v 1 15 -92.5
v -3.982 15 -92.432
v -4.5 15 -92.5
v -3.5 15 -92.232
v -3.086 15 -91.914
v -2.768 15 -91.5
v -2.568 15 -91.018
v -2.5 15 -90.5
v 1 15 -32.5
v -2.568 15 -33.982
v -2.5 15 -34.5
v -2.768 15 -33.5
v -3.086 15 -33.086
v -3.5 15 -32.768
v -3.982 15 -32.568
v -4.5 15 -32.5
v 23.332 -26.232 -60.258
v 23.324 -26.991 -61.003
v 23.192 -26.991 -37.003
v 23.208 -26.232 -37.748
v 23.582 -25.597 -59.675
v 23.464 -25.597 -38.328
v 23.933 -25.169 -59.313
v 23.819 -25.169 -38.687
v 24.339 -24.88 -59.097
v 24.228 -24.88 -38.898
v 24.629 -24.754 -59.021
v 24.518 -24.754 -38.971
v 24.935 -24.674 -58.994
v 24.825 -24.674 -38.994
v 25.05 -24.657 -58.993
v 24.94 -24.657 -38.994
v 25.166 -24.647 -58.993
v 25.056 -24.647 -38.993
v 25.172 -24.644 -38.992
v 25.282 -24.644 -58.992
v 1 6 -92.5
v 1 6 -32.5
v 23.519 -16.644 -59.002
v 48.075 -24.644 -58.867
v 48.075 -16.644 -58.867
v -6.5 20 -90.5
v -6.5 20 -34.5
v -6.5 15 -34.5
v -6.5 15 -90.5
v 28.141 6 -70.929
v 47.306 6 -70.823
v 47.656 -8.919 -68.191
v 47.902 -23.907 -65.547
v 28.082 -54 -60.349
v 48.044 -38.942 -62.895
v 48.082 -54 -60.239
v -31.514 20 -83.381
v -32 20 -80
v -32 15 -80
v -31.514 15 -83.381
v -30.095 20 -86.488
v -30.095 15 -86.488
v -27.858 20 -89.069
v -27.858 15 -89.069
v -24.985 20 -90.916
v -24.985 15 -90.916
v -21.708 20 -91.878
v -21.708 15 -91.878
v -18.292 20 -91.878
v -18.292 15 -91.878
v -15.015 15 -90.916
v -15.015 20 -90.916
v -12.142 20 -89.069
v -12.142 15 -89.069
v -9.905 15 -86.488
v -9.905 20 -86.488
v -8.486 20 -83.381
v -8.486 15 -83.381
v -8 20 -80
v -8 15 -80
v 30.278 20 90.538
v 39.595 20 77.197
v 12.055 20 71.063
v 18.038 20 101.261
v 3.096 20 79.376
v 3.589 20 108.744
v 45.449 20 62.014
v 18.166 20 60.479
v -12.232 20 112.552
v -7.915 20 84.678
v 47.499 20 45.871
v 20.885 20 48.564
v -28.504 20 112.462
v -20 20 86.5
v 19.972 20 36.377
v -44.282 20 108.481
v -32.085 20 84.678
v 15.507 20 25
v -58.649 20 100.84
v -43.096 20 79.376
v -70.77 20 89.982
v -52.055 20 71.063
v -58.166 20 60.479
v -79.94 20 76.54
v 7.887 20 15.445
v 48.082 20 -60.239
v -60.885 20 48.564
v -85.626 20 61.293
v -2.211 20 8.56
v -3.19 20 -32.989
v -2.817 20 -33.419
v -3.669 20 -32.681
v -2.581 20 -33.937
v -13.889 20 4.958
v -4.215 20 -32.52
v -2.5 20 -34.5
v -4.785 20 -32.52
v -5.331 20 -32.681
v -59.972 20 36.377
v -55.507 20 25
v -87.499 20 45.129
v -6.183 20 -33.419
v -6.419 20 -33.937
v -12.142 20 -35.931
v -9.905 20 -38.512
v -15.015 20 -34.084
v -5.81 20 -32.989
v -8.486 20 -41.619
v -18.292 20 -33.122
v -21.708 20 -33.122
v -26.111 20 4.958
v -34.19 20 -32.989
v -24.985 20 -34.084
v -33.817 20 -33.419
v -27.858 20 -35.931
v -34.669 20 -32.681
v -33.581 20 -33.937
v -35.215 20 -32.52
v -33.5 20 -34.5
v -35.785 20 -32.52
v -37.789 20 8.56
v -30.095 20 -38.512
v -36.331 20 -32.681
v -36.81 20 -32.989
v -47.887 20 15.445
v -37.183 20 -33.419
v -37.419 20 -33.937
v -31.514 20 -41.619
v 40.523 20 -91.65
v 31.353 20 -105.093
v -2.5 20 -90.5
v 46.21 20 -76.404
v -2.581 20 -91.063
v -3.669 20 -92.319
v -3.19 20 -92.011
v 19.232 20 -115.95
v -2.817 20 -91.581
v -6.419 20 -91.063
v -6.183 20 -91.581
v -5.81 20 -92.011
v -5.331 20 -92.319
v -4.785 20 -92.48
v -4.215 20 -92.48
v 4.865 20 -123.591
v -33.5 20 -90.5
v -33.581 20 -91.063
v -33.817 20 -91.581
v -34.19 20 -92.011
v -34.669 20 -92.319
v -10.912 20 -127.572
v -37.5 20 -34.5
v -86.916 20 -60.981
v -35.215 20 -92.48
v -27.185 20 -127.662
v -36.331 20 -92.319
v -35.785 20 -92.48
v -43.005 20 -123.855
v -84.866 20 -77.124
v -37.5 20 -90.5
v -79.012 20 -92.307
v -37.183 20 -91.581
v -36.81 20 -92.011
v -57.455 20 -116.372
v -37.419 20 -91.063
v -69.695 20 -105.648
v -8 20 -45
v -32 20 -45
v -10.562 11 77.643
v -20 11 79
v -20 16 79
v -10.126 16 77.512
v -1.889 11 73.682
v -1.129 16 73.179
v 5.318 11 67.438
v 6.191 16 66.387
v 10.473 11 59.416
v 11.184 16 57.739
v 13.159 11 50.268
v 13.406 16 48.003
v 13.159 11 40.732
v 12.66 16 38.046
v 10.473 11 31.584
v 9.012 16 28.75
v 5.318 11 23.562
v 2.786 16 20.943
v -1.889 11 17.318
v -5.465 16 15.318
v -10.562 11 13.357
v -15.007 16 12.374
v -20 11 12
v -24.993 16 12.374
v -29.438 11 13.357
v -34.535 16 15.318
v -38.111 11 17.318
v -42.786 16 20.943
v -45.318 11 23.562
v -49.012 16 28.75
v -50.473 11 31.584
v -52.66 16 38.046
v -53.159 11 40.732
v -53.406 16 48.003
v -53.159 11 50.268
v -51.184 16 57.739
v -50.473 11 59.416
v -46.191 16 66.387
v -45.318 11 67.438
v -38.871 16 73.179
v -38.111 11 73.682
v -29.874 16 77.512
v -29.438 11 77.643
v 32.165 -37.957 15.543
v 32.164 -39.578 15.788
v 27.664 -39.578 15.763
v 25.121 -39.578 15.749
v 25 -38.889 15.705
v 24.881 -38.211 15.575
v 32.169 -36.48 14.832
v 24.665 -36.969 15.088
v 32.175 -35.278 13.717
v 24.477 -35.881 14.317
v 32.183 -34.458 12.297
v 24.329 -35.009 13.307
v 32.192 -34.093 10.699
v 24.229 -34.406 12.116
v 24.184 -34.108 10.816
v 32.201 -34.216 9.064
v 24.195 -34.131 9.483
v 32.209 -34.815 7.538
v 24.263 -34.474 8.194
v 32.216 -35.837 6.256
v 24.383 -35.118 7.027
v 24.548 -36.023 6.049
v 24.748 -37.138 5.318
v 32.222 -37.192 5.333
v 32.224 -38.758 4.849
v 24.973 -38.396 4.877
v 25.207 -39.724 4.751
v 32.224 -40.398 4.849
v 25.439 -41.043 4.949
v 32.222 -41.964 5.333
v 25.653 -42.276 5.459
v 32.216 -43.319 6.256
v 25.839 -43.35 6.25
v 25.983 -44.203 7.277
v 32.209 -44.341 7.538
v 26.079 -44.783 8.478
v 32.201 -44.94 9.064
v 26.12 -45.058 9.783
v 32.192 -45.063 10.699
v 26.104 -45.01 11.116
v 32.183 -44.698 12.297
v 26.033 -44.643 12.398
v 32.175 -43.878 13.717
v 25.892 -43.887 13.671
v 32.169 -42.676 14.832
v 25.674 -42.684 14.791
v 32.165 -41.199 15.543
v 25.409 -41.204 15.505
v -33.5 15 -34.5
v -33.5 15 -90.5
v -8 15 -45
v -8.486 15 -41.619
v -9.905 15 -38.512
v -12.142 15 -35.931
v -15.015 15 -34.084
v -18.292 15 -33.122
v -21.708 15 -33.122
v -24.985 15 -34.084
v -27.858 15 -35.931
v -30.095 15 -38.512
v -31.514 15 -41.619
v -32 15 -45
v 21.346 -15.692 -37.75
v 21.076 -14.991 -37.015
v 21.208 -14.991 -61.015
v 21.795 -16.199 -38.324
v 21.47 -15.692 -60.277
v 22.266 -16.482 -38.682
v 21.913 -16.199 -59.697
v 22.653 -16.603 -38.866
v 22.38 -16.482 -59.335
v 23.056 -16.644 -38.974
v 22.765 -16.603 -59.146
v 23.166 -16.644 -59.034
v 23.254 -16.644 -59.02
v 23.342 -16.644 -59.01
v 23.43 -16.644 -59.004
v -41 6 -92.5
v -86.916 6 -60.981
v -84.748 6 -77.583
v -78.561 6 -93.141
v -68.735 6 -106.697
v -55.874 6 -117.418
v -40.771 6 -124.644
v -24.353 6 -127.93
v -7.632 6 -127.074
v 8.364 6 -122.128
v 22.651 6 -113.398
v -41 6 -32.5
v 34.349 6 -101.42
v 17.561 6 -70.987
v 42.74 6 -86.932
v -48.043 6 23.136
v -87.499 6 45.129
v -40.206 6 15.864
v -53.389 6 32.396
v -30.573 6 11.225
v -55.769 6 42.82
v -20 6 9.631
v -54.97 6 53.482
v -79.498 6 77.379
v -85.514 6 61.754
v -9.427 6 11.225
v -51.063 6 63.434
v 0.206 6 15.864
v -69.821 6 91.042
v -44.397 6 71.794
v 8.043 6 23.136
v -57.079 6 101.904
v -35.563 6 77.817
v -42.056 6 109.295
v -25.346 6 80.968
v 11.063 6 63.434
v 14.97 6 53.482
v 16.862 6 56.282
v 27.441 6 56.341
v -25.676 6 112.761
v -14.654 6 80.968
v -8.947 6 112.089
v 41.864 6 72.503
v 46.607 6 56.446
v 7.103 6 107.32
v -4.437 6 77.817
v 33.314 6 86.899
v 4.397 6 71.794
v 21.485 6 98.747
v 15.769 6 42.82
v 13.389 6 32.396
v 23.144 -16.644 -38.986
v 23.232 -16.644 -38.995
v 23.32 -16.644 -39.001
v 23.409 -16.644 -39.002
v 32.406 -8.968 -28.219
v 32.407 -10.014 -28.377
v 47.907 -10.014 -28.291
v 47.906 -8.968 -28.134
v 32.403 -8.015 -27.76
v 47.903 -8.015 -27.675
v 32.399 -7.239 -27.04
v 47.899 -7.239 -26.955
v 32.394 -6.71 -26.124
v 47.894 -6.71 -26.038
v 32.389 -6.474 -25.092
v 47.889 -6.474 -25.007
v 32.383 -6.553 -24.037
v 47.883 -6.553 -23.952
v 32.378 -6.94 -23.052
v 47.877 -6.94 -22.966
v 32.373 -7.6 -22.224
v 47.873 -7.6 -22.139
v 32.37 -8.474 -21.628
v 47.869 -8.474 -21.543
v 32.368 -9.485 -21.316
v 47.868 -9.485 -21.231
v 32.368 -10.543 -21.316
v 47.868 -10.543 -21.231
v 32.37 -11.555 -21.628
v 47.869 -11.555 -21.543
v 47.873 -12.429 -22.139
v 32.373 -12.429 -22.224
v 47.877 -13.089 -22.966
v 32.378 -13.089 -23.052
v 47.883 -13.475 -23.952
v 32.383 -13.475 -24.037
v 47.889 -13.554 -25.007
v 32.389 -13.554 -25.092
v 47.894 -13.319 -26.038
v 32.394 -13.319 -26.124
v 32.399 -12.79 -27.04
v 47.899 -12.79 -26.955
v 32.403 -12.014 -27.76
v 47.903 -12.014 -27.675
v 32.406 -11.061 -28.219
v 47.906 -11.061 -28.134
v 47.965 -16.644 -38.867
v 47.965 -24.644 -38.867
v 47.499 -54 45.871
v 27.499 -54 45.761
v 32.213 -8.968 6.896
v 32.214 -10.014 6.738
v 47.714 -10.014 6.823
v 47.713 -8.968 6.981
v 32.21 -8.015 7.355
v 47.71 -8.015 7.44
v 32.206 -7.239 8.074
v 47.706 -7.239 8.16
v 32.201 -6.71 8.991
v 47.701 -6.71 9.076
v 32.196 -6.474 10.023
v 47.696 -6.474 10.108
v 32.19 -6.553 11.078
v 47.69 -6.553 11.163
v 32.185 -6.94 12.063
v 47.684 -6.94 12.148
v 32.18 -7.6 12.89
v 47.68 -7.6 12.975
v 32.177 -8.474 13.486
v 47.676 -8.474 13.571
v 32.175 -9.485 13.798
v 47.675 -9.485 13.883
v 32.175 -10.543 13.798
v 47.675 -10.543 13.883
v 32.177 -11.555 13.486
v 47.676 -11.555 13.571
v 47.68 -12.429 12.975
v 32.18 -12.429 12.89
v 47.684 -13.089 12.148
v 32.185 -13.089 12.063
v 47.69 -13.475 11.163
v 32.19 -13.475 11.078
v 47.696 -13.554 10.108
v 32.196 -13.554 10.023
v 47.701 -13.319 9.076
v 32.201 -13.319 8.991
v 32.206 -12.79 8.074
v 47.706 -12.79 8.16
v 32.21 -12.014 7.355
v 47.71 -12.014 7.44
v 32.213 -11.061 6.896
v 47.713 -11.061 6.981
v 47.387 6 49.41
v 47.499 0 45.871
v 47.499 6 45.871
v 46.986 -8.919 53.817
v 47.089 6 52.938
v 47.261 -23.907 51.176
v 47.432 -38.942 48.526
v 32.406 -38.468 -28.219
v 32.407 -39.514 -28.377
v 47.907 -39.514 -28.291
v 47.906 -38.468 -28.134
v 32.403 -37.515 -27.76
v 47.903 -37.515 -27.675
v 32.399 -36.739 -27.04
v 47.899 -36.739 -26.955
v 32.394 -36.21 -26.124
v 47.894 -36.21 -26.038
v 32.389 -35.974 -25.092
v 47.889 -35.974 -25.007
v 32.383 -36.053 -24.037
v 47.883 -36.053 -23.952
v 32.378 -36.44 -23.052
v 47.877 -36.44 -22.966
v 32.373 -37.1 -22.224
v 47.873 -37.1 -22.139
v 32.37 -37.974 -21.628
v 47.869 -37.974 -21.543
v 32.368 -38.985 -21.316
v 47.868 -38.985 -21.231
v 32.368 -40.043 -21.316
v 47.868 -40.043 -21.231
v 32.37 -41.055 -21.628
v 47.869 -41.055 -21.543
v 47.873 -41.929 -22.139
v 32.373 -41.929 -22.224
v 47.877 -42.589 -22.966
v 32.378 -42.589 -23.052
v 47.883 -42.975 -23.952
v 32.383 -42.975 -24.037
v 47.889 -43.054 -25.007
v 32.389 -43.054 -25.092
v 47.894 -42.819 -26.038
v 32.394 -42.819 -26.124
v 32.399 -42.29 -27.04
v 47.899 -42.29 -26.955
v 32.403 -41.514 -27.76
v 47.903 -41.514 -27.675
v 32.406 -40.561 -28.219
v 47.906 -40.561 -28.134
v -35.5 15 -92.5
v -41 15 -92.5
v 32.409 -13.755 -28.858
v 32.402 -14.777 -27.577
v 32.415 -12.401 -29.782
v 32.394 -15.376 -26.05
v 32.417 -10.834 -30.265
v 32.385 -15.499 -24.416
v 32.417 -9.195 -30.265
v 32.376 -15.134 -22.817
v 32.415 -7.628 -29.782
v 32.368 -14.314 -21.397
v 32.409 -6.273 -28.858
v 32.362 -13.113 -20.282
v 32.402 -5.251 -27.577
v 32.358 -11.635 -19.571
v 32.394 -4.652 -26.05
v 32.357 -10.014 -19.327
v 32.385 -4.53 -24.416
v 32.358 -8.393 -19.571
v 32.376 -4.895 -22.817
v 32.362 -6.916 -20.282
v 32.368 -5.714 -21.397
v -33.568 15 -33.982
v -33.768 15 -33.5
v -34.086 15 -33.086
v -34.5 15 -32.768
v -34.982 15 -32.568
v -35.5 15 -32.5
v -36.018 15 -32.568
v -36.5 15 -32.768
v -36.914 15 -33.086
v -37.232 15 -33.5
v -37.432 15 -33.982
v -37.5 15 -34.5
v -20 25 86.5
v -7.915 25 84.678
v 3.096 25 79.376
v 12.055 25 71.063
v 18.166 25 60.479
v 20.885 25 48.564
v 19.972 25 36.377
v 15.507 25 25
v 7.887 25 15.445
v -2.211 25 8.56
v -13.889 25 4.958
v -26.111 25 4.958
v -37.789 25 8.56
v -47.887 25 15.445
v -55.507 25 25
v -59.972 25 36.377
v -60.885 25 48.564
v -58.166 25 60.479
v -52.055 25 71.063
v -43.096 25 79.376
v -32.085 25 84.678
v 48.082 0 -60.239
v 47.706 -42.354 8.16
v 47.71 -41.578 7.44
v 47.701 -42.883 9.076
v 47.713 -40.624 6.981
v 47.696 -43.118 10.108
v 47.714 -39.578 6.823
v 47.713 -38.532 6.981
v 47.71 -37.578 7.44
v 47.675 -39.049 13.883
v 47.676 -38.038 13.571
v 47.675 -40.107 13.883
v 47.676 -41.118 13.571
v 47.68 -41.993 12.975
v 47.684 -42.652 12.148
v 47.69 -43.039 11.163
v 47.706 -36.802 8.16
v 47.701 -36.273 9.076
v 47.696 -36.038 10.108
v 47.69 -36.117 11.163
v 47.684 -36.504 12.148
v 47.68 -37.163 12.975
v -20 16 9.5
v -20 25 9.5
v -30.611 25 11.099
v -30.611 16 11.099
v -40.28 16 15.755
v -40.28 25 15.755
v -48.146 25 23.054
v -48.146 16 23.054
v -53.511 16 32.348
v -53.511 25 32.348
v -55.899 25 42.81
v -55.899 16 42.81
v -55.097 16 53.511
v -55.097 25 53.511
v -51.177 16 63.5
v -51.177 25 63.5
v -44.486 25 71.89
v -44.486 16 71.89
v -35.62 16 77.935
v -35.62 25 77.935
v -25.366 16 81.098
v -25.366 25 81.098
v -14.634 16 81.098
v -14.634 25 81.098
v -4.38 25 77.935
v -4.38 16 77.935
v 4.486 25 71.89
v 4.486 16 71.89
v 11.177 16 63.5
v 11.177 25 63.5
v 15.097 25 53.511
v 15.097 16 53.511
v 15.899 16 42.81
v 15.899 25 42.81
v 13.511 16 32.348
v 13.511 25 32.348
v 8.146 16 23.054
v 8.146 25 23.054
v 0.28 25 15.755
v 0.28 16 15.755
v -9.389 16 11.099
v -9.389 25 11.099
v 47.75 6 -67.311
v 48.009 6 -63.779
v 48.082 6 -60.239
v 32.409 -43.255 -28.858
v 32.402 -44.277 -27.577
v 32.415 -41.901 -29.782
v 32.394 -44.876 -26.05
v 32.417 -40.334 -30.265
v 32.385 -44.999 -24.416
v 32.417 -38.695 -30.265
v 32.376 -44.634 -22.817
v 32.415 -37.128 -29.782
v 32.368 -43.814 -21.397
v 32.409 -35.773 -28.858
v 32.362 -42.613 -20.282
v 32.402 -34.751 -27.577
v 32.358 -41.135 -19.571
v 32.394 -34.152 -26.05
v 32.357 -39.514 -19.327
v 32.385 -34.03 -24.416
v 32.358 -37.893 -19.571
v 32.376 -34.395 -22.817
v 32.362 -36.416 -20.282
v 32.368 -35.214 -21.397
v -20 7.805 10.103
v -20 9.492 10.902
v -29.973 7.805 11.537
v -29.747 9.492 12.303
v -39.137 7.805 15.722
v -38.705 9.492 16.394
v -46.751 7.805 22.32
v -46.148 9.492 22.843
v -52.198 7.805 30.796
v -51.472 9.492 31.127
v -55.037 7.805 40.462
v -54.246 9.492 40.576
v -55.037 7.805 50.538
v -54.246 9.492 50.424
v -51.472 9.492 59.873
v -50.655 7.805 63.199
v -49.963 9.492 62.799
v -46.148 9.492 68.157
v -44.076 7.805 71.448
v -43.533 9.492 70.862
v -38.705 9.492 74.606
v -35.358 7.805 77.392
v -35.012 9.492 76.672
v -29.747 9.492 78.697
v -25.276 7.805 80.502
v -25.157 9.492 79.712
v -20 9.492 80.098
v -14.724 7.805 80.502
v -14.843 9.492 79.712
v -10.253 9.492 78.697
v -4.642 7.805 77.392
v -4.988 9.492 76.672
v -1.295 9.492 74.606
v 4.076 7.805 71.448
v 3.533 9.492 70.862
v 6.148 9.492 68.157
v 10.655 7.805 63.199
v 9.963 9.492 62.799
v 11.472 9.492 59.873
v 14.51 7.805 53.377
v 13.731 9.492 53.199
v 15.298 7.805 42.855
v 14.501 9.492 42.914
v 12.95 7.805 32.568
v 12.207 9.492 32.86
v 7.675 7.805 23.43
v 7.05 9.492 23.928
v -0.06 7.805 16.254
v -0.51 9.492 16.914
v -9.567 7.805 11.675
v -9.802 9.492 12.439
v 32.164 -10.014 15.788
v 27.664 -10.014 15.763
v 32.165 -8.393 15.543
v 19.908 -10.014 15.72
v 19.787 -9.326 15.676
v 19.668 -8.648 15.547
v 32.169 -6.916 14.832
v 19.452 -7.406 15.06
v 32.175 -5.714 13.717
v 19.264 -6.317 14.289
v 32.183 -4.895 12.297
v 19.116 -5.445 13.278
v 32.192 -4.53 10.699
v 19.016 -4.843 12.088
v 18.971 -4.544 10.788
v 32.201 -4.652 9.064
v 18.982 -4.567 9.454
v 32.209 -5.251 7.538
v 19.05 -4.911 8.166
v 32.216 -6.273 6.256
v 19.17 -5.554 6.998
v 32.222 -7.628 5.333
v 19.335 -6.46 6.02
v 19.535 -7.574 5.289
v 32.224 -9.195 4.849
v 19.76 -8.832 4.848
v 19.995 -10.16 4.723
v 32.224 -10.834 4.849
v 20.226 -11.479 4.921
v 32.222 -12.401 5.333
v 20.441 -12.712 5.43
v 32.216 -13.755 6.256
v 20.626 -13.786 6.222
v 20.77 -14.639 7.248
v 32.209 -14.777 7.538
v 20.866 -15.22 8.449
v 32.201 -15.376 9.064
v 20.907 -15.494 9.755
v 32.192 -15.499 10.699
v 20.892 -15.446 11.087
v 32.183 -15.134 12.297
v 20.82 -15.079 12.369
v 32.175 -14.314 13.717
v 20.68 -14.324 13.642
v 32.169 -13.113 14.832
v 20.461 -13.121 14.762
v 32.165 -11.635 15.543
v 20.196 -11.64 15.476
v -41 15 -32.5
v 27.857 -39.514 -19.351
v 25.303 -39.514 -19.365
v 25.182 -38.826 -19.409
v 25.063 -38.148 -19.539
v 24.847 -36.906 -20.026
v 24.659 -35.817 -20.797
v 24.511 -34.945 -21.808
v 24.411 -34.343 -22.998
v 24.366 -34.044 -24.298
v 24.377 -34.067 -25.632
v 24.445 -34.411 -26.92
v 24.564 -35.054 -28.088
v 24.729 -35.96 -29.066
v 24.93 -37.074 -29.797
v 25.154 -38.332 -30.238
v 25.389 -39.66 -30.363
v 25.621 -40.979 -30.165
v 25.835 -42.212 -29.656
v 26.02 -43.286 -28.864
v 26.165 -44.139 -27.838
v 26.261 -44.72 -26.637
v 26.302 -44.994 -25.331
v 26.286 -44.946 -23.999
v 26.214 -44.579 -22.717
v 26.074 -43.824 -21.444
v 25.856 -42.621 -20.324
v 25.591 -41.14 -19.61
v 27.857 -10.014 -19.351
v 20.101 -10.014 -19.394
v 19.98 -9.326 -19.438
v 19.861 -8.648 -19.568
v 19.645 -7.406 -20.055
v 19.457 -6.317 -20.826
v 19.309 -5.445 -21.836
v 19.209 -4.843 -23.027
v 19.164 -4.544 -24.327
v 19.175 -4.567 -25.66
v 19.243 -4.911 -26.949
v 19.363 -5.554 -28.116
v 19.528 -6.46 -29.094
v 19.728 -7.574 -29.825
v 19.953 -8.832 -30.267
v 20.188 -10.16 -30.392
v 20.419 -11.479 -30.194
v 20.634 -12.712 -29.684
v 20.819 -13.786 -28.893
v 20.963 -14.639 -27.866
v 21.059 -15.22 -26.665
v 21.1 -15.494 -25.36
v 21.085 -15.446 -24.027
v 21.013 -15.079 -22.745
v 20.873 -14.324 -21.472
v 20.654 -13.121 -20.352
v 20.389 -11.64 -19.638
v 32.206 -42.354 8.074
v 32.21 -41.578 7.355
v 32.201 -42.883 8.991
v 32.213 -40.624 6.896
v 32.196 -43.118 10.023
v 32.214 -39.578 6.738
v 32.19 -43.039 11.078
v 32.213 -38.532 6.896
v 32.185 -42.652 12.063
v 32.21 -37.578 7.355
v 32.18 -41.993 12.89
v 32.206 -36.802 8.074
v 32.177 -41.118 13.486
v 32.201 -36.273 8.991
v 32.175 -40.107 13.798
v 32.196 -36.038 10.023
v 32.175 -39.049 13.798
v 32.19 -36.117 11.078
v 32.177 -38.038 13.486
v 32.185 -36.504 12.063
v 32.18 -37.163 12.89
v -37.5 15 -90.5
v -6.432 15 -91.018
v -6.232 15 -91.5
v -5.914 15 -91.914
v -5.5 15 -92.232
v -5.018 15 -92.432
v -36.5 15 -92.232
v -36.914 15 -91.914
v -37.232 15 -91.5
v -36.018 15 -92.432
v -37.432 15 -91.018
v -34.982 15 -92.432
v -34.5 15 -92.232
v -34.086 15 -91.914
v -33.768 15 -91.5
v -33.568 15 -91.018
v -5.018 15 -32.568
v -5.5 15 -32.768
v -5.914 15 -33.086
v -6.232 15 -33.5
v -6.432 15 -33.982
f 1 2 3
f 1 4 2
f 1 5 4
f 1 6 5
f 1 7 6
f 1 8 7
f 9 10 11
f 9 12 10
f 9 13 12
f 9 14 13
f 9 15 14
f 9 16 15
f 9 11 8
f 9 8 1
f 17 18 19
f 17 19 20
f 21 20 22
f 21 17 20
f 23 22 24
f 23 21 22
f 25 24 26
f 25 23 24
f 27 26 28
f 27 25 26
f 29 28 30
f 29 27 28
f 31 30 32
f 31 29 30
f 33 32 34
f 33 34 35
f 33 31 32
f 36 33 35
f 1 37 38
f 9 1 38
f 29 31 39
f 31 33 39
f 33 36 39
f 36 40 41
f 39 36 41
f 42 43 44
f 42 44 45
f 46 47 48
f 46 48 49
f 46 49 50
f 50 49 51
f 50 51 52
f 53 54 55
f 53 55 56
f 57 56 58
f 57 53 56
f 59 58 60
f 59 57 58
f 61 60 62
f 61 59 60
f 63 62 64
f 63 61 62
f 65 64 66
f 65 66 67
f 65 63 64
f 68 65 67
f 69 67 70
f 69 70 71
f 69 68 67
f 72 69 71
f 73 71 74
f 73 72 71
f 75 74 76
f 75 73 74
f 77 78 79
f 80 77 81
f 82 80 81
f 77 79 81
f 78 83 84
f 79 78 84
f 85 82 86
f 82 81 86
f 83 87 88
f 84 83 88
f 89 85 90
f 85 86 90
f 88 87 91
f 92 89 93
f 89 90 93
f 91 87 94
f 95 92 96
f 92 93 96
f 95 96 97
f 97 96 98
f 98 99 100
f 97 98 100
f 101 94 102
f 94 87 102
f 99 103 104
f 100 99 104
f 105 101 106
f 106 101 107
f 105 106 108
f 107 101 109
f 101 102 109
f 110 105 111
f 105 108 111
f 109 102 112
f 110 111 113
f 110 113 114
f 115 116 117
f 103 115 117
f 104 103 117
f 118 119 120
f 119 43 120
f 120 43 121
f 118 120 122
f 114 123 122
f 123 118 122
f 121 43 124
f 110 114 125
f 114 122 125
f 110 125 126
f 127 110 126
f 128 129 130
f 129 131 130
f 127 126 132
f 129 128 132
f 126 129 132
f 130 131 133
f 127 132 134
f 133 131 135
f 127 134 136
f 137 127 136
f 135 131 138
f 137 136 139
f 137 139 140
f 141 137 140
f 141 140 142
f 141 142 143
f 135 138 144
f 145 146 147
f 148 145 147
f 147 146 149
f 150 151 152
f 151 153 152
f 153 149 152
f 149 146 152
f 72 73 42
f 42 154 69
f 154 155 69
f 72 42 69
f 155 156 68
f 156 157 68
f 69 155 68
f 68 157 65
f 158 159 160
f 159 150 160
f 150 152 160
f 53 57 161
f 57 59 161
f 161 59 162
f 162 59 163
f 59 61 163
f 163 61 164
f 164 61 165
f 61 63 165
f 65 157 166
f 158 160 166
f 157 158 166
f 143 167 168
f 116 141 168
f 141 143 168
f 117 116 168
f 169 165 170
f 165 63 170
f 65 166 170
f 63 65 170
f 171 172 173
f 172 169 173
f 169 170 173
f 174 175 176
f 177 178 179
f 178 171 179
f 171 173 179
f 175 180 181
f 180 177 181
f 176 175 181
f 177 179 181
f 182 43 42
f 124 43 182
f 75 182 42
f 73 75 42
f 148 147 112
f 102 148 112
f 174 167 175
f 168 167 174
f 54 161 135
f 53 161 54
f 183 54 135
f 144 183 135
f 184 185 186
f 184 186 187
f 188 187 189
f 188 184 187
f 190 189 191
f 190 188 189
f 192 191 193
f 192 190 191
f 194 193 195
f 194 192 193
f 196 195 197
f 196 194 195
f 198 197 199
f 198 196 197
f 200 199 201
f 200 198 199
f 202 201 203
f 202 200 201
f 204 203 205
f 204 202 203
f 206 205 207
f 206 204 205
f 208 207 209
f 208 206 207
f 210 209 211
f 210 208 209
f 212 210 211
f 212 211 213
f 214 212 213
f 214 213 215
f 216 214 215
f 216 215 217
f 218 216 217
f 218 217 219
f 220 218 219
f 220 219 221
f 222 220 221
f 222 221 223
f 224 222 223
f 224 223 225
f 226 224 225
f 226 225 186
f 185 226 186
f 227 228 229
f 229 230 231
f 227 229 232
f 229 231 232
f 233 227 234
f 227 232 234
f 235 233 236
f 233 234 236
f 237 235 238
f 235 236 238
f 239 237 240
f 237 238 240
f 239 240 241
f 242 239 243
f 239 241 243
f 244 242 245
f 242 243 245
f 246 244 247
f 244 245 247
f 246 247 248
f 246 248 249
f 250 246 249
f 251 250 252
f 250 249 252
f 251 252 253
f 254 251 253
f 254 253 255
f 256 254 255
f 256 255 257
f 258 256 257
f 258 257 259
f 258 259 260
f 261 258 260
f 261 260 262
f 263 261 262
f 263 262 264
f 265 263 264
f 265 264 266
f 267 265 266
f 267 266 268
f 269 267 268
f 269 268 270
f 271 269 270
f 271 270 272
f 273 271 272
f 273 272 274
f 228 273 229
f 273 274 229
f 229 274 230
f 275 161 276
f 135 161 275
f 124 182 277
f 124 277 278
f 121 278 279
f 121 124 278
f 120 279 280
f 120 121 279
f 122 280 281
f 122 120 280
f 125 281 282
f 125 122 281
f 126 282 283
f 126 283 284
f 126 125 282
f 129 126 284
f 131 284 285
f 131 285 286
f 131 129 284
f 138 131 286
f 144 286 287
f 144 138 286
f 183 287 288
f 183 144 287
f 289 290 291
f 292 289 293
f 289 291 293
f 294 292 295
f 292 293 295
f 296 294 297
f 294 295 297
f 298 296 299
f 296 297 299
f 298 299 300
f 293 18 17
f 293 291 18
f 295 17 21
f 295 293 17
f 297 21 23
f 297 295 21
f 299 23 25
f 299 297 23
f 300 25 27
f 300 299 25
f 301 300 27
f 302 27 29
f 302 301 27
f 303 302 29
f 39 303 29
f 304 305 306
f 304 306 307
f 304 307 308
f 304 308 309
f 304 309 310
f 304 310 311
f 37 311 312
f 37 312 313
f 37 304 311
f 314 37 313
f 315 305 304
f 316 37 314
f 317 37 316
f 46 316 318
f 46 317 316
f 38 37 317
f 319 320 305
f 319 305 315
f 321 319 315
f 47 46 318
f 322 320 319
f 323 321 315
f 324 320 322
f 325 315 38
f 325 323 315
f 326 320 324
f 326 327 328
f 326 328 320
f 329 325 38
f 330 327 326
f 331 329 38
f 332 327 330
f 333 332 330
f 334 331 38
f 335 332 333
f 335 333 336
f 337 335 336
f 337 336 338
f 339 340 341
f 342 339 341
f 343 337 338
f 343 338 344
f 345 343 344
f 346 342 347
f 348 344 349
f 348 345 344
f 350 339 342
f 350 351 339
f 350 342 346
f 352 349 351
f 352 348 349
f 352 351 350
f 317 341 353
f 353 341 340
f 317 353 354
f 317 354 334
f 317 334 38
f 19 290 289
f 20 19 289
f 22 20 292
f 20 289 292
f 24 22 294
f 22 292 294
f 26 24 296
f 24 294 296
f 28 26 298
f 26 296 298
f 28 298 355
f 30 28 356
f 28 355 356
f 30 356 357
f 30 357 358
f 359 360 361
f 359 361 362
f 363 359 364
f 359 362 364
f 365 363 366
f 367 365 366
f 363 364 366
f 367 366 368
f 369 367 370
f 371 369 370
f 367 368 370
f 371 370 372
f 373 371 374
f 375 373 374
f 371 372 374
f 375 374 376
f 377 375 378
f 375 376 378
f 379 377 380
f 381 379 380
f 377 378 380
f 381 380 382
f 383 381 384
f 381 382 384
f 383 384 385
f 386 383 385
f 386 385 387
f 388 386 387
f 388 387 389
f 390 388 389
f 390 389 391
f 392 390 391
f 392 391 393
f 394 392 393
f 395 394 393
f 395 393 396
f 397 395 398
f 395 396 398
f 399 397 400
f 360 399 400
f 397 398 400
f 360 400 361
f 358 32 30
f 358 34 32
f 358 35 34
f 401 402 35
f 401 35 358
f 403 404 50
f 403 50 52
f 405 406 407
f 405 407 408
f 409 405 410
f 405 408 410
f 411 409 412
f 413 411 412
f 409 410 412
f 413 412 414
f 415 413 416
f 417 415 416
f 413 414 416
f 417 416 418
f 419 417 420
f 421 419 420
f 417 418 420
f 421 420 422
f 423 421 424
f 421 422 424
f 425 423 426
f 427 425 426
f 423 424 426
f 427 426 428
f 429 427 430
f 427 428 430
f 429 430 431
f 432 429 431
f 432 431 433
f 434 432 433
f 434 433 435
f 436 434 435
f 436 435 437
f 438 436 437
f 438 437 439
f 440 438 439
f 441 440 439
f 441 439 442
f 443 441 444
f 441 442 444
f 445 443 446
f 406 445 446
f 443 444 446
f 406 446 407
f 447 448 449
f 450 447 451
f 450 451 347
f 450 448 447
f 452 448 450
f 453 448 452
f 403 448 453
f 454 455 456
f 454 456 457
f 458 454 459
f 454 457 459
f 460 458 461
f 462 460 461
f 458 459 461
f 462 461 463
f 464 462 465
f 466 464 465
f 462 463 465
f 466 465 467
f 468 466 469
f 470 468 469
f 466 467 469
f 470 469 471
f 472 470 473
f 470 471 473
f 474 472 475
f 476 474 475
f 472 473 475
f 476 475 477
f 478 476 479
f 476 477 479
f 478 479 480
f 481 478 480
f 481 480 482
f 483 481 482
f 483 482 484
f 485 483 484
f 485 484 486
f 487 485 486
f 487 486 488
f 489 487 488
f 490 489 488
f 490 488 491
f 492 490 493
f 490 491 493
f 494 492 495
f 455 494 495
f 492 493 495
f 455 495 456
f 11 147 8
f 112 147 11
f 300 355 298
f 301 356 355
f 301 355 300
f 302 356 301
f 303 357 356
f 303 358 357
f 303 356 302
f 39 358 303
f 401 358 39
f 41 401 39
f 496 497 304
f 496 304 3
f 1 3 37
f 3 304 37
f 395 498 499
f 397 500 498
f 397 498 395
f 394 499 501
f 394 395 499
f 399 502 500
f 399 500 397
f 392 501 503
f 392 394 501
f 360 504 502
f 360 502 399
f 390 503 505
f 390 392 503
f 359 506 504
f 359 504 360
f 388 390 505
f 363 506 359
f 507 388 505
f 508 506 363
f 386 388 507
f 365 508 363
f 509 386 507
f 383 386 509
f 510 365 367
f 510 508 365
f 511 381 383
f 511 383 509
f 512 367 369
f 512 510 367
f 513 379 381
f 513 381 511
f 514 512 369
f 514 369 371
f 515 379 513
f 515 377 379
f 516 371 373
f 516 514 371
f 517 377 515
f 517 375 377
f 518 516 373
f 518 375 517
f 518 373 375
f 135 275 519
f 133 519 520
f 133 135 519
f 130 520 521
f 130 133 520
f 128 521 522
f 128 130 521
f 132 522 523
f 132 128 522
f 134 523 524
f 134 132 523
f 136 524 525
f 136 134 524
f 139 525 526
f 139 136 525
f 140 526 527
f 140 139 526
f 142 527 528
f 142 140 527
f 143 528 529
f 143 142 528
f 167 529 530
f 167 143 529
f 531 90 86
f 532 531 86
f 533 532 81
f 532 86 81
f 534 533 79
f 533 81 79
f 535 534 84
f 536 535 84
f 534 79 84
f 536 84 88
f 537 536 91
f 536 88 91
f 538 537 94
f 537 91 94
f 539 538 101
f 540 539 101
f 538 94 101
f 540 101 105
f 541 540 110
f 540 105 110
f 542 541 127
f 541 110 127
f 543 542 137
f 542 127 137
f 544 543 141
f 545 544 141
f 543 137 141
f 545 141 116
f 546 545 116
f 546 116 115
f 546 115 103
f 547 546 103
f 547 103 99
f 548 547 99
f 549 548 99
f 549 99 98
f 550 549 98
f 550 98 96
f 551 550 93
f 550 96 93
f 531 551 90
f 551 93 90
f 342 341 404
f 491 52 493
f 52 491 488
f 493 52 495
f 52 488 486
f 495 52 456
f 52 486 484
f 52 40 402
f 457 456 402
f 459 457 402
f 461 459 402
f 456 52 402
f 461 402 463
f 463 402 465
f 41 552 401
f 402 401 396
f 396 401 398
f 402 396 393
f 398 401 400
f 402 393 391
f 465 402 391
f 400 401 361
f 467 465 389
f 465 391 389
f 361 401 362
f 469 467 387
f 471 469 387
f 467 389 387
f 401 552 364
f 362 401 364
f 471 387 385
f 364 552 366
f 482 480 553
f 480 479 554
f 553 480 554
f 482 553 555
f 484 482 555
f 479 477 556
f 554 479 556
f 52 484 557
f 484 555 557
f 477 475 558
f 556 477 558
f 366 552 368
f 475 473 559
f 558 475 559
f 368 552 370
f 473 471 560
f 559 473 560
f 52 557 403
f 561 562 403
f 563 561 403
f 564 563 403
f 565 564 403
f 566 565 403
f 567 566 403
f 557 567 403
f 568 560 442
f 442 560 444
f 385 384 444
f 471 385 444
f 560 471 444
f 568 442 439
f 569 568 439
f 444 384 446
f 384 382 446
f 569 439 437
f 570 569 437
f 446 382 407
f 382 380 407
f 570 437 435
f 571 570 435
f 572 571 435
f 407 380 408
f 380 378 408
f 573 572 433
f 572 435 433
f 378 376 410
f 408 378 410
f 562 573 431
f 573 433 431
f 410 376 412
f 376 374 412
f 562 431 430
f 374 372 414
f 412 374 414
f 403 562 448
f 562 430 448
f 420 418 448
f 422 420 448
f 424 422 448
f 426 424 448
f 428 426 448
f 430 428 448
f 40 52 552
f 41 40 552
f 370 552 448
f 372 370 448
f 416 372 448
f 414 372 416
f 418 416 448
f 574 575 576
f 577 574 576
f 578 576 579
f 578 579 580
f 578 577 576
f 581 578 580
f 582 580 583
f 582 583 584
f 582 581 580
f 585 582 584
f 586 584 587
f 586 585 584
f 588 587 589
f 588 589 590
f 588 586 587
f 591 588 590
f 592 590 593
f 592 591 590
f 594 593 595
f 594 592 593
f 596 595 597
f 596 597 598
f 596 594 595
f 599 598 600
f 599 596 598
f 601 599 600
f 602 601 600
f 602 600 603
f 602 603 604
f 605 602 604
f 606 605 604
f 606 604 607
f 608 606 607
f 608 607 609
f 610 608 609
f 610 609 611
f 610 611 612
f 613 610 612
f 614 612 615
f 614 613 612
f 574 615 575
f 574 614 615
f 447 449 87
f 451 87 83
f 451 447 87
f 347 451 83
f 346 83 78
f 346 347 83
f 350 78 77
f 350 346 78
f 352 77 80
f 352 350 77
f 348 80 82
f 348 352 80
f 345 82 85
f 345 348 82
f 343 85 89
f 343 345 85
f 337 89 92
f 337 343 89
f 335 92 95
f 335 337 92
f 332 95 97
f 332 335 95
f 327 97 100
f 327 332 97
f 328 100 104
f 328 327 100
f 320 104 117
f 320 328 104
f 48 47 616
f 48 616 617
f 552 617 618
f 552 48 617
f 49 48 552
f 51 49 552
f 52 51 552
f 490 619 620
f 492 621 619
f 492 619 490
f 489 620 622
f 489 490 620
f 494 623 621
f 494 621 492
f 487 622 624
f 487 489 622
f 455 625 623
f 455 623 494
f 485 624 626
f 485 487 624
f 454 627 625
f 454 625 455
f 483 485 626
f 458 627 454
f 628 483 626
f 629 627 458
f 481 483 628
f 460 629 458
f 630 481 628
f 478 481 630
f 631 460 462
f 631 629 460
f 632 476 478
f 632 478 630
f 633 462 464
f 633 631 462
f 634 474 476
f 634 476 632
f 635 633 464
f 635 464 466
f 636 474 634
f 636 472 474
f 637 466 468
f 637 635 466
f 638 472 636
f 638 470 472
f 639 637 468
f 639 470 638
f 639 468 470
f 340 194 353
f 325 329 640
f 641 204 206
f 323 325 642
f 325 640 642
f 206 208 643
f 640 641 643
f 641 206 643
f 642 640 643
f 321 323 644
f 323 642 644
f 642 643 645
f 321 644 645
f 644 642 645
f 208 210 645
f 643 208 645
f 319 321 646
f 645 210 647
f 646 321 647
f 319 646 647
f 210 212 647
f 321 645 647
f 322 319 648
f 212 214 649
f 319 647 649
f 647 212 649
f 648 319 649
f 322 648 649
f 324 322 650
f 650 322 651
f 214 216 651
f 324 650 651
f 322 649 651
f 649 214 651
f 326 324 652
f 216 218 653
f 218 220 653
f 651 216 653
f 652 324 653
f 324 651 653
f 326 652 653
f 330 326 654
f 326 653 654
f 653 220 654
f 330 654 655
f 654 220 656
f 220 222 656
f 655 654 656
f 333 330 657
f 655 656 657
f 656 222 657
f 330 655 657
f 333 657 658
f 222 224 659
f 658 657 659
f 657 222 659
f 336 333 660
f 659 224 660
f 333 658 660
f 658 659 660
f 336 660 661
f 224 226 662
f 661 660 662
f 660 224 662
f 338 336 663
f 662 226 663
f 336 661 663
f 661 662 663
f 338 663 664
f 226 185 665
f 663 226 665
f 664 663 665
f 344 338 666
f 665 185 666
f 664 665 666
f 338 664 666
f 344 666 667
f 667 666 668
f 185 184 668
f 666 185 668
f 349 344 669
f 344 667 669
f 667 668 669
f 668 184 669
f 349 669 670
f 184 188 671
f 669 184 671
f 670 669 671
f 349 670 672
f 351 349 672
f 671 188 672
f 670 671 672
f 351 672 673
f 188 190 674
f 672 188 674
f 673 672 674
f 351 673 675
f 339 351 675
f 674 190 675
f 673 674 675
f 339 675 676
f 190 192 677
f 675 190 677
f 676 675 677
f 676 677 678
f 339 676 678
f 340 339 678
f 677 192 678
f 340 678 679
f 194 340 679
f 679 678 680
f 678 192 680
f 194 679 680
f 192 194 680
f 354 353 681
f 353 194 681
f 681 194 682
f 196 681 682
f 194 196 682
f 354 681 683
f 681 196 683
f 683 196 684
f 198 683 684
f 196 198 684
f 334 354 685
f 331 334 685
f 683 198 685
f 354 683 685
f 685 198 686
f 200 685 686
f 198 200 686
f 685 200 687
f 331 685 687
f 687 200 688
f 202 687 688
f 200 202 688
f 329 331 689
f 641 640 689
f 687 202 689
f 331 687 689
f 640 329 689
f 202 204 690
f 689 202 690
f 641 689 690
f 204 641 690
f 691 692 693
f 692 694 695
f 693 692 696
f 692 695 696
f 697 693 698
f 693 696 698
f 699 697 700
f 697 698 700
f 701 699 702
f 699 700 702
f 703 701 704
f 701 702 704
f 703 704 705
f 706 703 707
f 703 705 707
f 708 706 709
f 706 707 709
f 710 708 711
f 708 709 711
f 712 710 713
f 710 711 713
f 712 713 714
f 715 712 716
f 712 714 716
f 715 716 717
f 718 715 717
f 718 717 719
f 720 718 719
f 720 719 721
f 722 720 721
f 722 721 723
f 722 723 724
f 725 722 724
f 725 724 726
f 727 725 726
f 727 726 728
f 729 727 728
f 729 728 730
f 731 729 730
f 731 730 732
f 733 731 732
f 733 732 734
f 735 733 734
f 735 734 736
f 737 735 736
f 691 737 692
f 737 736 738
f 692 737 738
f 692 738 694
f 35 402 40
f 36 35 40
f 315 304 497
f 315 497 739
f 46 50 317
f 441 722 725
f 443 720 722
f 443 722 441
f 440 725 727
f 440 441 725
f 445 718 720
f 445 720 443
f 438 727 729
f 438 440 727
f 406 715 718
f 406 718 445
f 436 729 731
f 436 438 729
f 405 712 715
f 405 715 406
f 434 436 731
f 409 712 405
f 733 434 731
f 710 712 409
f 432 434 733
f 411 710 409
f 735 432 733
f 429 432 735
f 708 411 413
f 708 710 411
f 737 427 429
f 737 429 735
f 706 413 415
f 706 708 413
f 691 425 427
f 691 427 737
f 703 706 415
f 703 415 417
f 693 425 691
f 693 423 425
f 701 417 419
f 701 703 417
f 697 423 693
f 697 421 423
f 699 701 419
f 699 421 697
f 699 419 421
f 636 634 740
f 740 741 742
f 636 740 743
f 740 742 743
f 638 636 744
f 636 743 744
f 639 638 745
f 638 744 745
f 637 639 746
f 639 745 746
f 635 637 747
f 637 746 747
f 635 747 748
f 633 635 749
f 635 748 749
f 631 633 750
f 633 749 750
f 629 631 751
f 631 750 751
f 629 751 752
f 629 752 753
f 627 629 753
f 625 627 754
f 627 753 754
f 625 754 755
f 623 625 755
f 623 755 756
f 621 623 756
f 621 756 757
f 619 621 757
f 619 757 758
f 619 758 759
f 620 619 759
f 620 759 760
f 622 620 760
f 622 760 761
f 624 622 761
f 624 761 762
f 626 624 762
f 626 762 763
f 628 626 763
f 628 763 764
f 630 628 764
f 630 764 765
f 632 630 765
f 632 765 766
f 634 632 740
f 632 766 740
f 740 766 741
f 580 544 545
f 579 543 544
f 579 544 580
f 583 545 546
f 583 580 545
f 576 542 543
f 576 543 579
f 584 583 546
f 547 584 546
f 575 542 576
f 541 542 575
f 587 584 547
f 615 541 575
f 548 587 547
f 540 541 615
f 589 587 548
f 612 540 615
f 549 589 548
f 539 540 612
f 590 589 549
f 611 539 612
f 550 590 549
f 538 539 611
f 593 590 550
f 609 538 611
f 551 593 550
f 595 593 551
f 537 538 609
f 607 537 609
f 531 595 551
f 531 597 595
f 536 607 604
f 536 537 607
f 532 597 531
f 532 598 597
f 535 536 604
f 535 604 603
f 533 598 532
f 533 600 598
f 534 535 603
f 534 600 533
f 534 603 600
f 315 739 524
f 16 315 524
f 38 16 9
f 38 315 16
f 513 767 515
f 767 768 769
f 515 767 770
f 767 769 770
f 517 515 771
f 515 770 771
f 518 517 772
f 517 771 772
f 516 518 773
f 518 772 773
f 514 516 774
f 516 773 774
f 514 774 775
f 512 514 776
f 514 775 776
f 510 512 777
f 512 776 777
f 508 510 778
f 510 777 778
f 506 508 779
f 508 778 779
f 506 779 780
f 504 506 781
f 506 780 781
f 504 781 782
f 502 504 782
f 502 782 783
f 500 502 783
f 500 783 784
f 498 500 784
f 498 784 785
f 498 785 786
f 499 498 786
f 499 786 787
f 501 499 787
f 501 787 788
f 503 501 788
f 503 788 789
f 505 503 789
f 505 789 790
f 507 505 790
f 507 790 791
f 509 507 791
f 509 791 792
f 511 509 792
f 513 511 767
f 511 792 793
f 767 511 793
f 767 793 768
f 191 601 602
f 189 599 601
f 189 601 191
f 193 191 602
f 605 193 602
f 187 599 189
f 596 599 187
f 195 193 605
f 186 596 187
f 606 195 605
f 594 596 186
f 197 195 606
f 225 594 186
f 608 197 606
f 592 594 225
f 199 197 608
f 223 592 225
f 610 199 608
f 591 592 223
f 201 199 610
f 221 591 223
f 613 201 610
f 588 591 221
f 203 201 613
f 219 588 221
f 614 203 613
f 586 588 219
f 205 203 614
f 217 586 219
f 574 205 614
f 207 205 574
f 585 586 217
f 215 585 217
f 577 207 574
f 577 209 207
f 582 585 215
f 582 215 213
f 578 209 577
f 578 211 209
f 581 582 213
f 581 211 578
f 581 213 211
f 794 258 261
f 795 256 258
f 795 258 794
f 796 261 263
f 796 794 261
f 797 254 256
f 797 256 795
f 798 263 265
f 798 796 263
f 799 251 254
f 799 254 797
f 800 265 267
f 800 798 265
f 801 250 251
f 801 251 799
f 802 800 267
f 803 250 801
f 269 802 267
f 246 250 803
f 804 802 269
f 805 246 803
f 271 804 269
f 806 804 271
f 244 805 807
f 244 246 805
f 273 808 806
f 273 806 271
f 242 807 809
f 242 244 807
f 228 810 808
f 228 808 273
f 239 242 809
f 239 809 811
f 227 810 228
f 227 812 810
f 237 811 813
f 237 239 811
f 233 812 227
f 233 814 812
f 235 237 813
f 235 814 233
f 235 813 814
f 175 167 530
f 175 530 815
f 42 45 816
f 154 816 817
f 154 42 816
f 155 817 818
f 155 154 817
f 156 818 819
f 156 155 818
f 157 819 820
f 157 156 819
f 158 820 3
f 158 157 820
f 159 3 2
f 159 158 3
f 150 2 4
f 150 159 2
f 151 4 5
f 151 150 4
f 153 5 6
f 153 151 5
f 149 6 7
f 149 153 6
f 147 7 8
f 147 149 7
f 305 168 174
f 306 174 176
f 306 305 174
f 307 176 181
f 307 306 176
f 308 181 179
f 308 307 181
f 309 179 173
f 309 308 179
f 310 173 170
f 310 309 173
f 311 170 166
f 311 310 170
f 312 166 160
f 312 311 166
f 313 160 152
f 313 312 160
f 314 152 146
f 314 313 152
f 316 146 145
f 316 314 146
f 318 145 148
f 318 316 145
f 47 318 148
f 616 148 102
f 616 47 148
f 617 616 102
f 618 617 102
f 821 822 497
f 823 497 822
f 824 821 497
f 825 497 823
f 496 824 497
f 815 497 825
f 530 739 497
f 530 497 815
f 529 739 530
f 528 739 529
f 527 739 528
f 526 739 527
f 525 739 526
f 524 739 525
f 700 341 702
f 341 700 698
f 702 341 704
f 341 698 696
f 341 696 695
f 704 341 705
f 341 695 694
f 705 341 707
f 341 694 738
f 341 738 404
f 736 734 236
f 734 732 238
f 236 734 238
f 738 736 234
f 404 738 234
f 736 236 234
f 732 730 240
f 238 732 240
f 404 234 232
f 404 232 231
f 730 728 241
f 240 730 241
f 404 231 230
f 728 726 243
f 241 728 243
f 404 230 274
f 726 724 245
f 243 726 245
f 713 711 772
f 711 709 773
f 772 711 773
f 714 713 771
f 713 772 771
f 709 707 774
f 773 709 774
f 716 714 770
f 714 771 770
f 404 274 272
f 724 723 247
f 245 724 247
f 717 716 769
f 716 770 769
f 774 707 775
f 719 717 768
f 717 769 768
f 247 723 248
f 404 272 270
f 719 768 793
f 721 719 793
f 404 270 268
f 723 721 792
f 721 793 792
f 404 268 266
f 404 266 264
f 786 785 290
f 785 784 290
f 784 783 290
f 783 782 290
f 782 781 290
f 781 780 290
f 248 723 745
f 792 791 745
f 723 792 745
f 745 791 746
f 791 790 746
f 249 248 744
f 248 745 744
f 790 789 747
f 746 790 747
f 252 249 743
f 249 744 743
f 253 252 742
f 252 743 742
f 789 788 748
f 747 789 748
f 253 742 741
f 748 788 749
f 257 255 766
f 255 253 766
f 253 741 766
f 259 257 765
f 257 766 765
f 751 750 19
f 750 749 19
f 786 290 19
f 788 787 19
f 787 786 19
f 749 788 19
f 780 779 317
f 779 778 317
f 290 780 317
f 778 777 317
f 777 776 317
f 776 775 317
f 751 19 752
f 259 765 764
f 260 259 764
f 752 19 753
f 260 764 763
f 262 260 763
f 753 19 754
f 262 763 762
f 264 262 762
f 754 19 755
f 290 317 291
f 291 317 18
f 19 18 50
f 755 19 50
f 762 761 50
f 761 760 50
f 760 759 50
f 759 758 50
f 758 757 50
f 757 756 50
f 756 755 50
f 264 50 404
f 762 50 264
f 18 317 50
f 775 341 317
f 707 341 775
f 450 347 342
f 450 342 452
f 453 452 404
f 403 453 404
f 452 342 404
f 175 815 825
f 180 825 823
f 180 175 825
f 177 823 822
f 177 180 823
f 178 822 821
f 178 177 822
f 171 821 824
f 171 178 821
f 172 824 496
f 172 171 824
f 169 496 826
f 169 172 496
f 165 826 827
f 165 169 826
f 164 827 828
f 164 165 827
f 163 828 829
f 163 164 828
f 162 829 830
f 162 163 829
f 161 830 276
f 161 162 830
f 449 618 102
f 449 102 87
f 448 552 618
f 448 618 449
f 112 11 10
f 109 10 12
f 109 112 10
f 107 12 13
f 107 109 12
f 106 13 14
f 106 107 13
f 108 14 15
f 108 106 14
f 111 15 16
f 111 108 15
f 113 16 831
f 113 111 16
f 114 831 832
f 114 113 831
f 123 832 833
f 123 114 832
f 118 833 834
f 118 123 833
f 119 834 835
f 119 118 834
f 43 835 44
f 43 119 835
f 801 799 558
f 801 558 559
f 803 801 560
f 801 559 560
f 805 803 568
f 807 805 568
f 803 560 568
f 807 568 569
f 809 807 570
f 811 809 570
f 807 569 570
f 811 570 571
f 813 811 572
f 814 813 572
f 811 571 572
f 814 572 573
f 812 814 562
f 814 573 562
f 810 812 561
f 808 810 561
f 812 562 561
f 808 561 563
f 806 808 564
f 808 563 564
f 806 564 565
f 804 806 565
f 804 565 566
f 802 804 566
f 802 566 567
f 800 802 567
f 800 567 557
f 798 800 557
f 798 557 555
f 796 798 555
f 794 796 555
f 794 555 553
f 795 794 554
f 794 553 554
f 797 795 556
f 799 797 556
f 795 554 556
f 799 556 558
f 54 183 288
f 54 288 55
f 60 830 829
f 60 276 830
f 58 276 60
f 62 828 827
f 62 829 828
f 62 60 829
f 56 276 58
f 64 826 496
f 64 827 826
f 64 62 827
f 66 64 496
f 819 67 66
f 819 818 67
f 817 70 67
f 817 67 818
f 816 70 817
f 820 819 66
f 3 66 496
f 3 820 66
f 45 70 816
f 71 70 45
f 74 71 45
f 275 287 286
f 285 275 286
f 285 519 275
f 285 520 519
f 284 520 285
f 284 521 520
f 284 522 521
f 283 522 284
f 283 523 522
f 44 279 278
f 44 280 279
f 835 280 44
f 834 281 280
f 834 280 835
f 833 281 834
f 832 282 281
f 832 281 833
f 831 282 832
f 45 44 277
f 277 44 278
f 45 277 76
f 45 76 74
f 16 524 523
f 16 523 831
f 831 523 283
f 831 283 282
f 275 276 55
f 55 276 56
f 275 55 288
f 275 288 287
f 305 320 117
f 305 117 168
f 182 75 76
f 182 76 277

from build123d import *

# Parameters (mm, degrees)
BOSS_EXTRUDE1_DEPTH              = 20
SKETCH8_W                        = 42
SKETCH8_H                        = 60
CUT_EXTRUDE1_DEPTH               = 15
CUT_EXTRUDE2_START               = -5
CUT_EXTRUDE2_DEPTH               = 5
SKETCH10_R                       = 36
CUT_EXTRUDE3_DEPTH               = 157.424129235
SKETCH11_R                       = 41
SKETCH11_R_2                     = 36
BOSS_EXTRUDE4_DEPTH              = 5
SKETCH13_W                       = 106.111938503
SKETCH13_H                       = 55
SKETCH13_R                       = 3
BOSS_EXTRUDE9_DEPTH              = 20
BOSS_EXTRUDE13_START             = -5
SKETCH14_R                       = 36
SKETCH14_R_2                     = 33.5
BOSS_EXTRUDE13_DEPTH             = 5
FILLET1_R                        = 10
CUT_EXTRUDE4_DEPTH               = 6
CBORE_FOR_M6_5_SHSS1_D           = 7.1
CBORE_FOR_M6_5_SHSS1_CBORE_D     = 11
CBORE_FOR_M6_5_SHSS1_CBORE_DEPTH = 4.5
CHAMFER5_SIZE                    = 10.579618843
CHAMFER5_SIZE_2                  = 60
CUT_EXTRUDE5_DEPTH               = 1
SKETCH23_W                       = 20
SKETCH23_H                       = 8
CUT_EXTRUDE6_DEPTH               = 34
FILLET5_R                        = 2


with BuildPart() as part:
    # Sketch1 → Boss-Extrude1 (new body)
    with BuildSketch(Plane(origin=(0, 0, 0), x_dir=(1, 0, 0), z_dir=(0, 1, 0))):
        with BuildLine():
            Line((48.082138056, 60.239377577), (47.498980657, -45.87095849))
            ThreePointArc((47.498980657, -45.87095849), (-20.370958489, -112.998980658), (-87.498980658, -45.129041511))
            Line((-87.498980658, -45.129041511), (-86.915823259, 60.981294555))
            ThreePointArc((-86.915823259, 60.981294555), (-19.045884112, 128.109316723), (48.082138056, 60.239377577))
        make_face()
    extrude(amount=BOSS_EXTRUDE1_DEPTH)

    # Sketch8 → Cut-Extrude1 (cut)
    with BuildSketch(Plane.XZ):
        with Locations((-20, -62.5)):
            Rectangle(SKETCH8_W, SKETCH8_H)
    extrude(amount=-CUT_EXTRUDE1_DEPTH, mode=Mode.SUBTRACT)

    # Cut-Extrude2: read off the stored shape, not the designer's step
    # Cut-Extrude2 outline → Cut-Extrude2 (cut)
    with BuildSketch(Plane.XZ.offset(-15).offset(CUT_EXTRUDE2_START)):
        with BuildLine():
            Line((-6.5, -34.5), (-6.5, -90.5))
            ThreePointArc((-6.5, -90.5), (-4.5, -92.5), (-2.5, -90.5))
            Line((-2.5, -90.5), (-2.5, -34.5))
            ThreePointArc((-2.5, -34.5), (-4.5, -32.5), (-6.5, -34.5))
        make_face()
        with BuildLine():
            ThreePointArc((-8, -45), (-20, -33), (-32, -45))
            Line((-32, -45), (-32, -80))
            ThreePointArc((-32, -80), (-20, -92), (-8, -80))
            Line((-8, -80), (-8, -45))
        make_face()
        with BuildLine():
            Line((-37.5, -34.5), (-37.5, -90.5))
            ThreePointArc((-37.5, -90.5), (-35.5, -92.5), (-33.5, -90.5))
            Line((-33.5, -90.5), (-33.5, -34.5))
            ThreePointArc((-33.5, -34.5), (-35.5, -32.5), (-37.5, -34.5))
        make_face()
    extrude(amount=CUT_EXTRUDE2_DEPTH, mode=Mode.SUBTRACT)

    # Sketch10 → Cut-Extrude3 (cut, through all)
    with BuildSketch(Plane.XZ):
        with Locations(Location((-20, 45.5, 0), (0, 0, 270))):
            Circle(SKETCH10_R)
    extrude(amount=-CUT_EXTRUDE3_DEPTH, mode=Mode.SUBTRACT)

    # Sketch11 → Boss-Extrude4 (add)
    with BuildSketch(Plane(origin=(0, 20, 0), x_dir=(1, 0, 0), z_dir=(0, 1, 0))):
        with Locations(Location((-20, -45.5, 0), (0, 0, 270))):
            Circle(SKETCH11_R)
        with Locations(Location((-20, -45.5, 0), (0, 0, 90))):
            Circle(SKETCH11_R_2, mode=Mode.SUBTRACT)
    extrude(amount=BOSS_EXTRUDE4_DEPTH)

    # Sketch13 → Boss-Extrude9 (add)
    with BuildSketch(Plane(origin=(27.749936459, 0, 0.152507111), x_dir=(-0.00549568132488102, 0, 0.999984898629362), z_dir=(-0.999984898629362, 0, -0.00549568132488102))):
        with Locations((-7.446742736, -27.5)):
            Rectangle(SKETCH13_W, SKETCH13_H)
        with Locations((-25.004242736, -10.014310552)):
            Circle(SKETCH13_R, mode=Mode.SUBTRACT)
        with Locations((10.110757264, -10.014310552)):
            Circle(SKETCH13_R, mode=Mode.SUBTRACT)
        with Locations((10.110757264, -39.577999726)):
            Circle(SKETCH13_R, mode=Mode.SUBTRACT)
        with Locations((-25.004242736, -39.514310552)):
            Circle(SKETCH13_R, mode=Mode.SUBTRACT)
    extrude(amount=-BOSS_EXTRUDE9_DEPTH)

    # Sketch14 → Boss-Extrude13 (add)
    with BuildSketch(Plane(origin=(0, 16, 0), x_dir=(1, 0, 0), z_dir=(0, 1, 0)).offset(BOSS_EXTRUDE13_START)):
        with Locations(Location((-20, -45.5, 0), (0, 0, 90))):
            Circle(SKETCH14_R)
        with Locations(Location((-20, -45.5, 0), (0, 0, 270))):
            Circle(SKETCH14_R_2, mode=Mode.SUBTRACT)
    extrude(amount=BOSS_EXTRUDE13_DEPTH)

    # Fillet1
    # the kernel refuses this fillet: 10 mm, written as the material it adds along each edge
    with BuildSketch(Plane(origin=(-20, 11, 45.5), x_dir=(0, 0, -1), z_dir=(1, 0, 0))) as fillet1_piece_1:
        with BuildLine():
            CenterArc((26, -6.614378278), FILLET1_R, 0, 41.409622109)
            Line((36, -6.614378278), (36.2, -6.614378278))
            Line((36.2, -6.614378278), (36.2, 0))
            Line((36.2, 0), (36, 0.2))
            ThreePointArc((36, 0.2), (34.75, 0.2), (33.65, 0.132287566))
            Line((33.65, 0.132287566), (33.5, 0))
        make_face()
    revolve(axis=Axis((-20, 11, 45.5), (0, 1, 0)))

    # Sketch15 → Cut-Extrude4 (cut)
    with BuildSketch(Plane.XZ):
        with BuildLine():
            Line((27.499282685, 45.761044864), (47.498980657, 45.87095849))
            ThreePointArc((47.498980657, 45.87095849), (-20.370958489, 112.998980658), (-87.498980658, 45.129041511))
            Line((-87.498980658, 45.129041511), (-86.915823259, -60.981294555))
            ThreePointArc((-86.915823259, -60.981294555), (-19.045884112, -128.109316723), (48.082138056, -60.239377577))
            Line((48.082138056, -60.239377577), (28.082440084, -60.349291203))
            Line((28.082440084, -60.349291203), (27.499282685, 45.761044864))
        make_face()
    extrude(amount=-CUT_EXTRUDE4_DEPTH, mode=Mode.SUBTRACT)

    # CBORE for M6.5 SHSS1 (through all)
    with Locations(Plane(origin=(27.749936459, 0, 0.152507111), x_dir=(-0.005495681324881029, 0, 0.999984898629362), z_dir=(-0.999984898629362, 0, -0.005495681324881029))):
        with Locations((10.110757264, -39.577999726), (-25.004242736, -39.514310552), (10.110757264, -10.014310552), (-25.004242736, -10.014310552)):
            CounterBoreHole(CBORE_FOR_M6_5_SHSS1_D / 2, CBORE_FOR_M6_5_SHSS1_CBORE_D / 2, CBORE_FOR_M6_5_SHSS1_CBORE_DEPTH)

    # Chamfer5
    # the kernel refuses this chamfer: 60, 10.579618843 mm, written as the material it adds along each edge
    with BuildSketch(Plane(origin=(28.939284552, 6, -216.259264498), x_dir=(-0.9999848986293619, 0, -0.00549568132488103), z_dir=(-0.00549568132488103, 0, 0.999984898629362))) as chamfer5_piece_1_section:
        Polygon((CHAMFER5_SIZE, 0), (0, CHAMFER5_SIZE_2), (0, 0), align=None)
    chamfer5_piece_1 = extrude(amount=417.936594073, mode=Mode.PRIVATE)
    chamfer5_piece_1 = chamfer5_piece_1 - Plane(origin=(27.887351809, -10.014310552, -24.851358027), x_dir=(-0.005495681324881029, 0, 0.999984898629362), z_dir=(-0.999984898629362, 0, -0.005495681324881029)) * Cylinder(5.5, 1076, mode=Mode.PRIVATE)
    chamfer5_piece_1 = chamfer5_piece_1 - Plane(origin=(27.694370959, -10.014310552, 10.263111688), x_dir=(-0.005495681324881029, 0, 0.999984898629362), z_dir=(-0.999984898629362, 0, -0.005495681324881029)) * Cylinder(5.5, 1076, mode=Mode.PRIVATE)
    chamfer5_piece_1 = chamfer5_piece_1 - Plane(origin=(27.887351809, -39.514310552, -24.851358027), x_dir=(-0.005495681324881029, 0, 0.999984898629362), z_dir=(-0.999984898629362, 0, -0.005495681324881029)) * Cylinder(5.5, 1076, mode=Mode.PRIVATE)
    chamfer5_piece_1 = chamfer5_piece_1 - Plane(origin=(27.694370959, -39.577999726, 10.263111688), x_dir=(-0.005495681324881029, 0, 0.999984898629362), z_dir=(-0.999984898629362, 0, -0.005495681324881029)) * Cylinder(5.5, 1076, mode=Mode.PRIVATE)
    chamfer5_piece_1 = split(chamfer5_piece_1, bisect_by=Plane(origin=(27.486315043, -40.618009932, 48.120615135), z_dir=(0.0054121895768273285, 0.17364817766693125, -0.9847928810653225)), keep=Keep.TOP, mode=Mode.PRIVATE)
    chamfer5_piece_1 = split(chamfer5_piece_1, bisect_by=Plane(origin=(28.164666117, 30.853356971, -75.311001495), z_dir=(-0.00541218957682626, 0.17364817766693136, 0.9847928810653225)), keep=Keep.TOP, mode=Mode.PRIVATE)
    add(chamfer5_piece_1)
    with BuildSketch(Plane(origin=(203.992111352, 6, -59.382533108), x_dir=(0.005495681324880034, 0, -0.9999848986293619), z_dir=(-0.999984898629362, 0, -0.005495681324880034))) as chamfer5_piece_2_section:
        Polygon((CHAMFER5_SIZE, 0), (0, CHAMFER5_SIZE_2), (0, 0), align=None)
    chamfer5_piece_2 = extrude(amount=331.824655571, mode=Mode.PRIVATE)
    chamfer5_piece_2 = chamfer5_piece_2 & Plane(origin=(-19.416842601, 6, -60.610336066), x_dir=(-0.999984898629362, 0, -0.005495681324881549), z_dir=(0, -1, 0)) * Cylinder(67.5, 904, mode=Mode.PRIVATE)
    chamfer5_piece_2 = split(chamfer5_piece_2, bisect_by=Plane(origin=(23.126316359, -25.892001157, -60.376528891), z_dir=(0.9847928810653225, 0.1736481776669314, 0.005412189576827241)), keep=Keep.TOP, mode=Mode.PRIVATE)
    add(chamfer5_piece_2)
    with BuildSketch(Plane(origin=(-128.410690611, 6, 44.904200396), x_dir=(-0.005495681324881117, 0, 0.9999848986293619), z_dir=(0.999984898629362, 0, 0.005495681324881118))) as chamfer5_piece_3_section:
        Polygon((CHAMFER5_SIZE, 0), (0, CHAMFER5_SIZE_2), (0, 0), align=None)
    chamfer5_piece_3 = extrude(amount=331.824655571, mode=Mode.PRIVATE)
    chamfer5_piece_3 = chamfer5_piece_3 & Plane(origin=(-20, 6, 45.500000001), x_dir=(0.999984898629362, 0, 0.0054956813248813385), z_dir=(0, -1, 0)) * Cylinder(67.5, 904, mode=Mode.PRIVATE)
    chamfer5_piece_3 = split(chamfer5_piece_3, bisect_by=Plane(origin=(12.537572393, 30.853356971, 45.67881883), z_dir=(0.9847928810653225, 0.1736481776669314, 0.005412189576827241)), keep=Keep.TOP, mode=Mode.PRIVATE)
    add(chamfer5_piece_3)

    # Sketch22 → Cut-Extrude5 (cut)
    with BuildSketch(Plane.XZ.offset(55)):
        Polygon((27.499282685, 45.761044864), (28.082440084, -60.349291203), (48.082138056, -60.239377577), (47.498980657, 45.87095849), align=None)
    extrude(amount=-CUT_EXTRUDE5_DEPTH, mode=Mode.SUBTRACT)

    # Sketch23 → Cut-Extrude6 (cut)
    with BuildSketch(Plane(origin=(47.749634432, 0, 0.262420737), x_dir=(0.005495681324880889, 0, -0.999984898629362), z_dir=(0.999984898629362, 0, 0.005495681324880889))):
        with Locations((49.130161201, -20.643803513)):
            Rectangle(SKETCH23_W, SKETCH23_H)
    extrude(amount=-CUT_EXTRUDE6_DEPTH, mode=Mode.SUBTRACT)

    # Fillet5
    fillet5_edges = [part.edges().sort_by_distance(p)[0] for p in [
        (21.433134302, -16.643803513, -49.01311169),
        (22.083474761, -20.643803513, -39.009386557),
        (22.843728846, -24.643803513, -49.005359395),
        (22.193388387, -20.643803513, -59.009084529),
    ]]
    fillet(fillet5_edges, radius=FILLET5_R)


solid = part.part
